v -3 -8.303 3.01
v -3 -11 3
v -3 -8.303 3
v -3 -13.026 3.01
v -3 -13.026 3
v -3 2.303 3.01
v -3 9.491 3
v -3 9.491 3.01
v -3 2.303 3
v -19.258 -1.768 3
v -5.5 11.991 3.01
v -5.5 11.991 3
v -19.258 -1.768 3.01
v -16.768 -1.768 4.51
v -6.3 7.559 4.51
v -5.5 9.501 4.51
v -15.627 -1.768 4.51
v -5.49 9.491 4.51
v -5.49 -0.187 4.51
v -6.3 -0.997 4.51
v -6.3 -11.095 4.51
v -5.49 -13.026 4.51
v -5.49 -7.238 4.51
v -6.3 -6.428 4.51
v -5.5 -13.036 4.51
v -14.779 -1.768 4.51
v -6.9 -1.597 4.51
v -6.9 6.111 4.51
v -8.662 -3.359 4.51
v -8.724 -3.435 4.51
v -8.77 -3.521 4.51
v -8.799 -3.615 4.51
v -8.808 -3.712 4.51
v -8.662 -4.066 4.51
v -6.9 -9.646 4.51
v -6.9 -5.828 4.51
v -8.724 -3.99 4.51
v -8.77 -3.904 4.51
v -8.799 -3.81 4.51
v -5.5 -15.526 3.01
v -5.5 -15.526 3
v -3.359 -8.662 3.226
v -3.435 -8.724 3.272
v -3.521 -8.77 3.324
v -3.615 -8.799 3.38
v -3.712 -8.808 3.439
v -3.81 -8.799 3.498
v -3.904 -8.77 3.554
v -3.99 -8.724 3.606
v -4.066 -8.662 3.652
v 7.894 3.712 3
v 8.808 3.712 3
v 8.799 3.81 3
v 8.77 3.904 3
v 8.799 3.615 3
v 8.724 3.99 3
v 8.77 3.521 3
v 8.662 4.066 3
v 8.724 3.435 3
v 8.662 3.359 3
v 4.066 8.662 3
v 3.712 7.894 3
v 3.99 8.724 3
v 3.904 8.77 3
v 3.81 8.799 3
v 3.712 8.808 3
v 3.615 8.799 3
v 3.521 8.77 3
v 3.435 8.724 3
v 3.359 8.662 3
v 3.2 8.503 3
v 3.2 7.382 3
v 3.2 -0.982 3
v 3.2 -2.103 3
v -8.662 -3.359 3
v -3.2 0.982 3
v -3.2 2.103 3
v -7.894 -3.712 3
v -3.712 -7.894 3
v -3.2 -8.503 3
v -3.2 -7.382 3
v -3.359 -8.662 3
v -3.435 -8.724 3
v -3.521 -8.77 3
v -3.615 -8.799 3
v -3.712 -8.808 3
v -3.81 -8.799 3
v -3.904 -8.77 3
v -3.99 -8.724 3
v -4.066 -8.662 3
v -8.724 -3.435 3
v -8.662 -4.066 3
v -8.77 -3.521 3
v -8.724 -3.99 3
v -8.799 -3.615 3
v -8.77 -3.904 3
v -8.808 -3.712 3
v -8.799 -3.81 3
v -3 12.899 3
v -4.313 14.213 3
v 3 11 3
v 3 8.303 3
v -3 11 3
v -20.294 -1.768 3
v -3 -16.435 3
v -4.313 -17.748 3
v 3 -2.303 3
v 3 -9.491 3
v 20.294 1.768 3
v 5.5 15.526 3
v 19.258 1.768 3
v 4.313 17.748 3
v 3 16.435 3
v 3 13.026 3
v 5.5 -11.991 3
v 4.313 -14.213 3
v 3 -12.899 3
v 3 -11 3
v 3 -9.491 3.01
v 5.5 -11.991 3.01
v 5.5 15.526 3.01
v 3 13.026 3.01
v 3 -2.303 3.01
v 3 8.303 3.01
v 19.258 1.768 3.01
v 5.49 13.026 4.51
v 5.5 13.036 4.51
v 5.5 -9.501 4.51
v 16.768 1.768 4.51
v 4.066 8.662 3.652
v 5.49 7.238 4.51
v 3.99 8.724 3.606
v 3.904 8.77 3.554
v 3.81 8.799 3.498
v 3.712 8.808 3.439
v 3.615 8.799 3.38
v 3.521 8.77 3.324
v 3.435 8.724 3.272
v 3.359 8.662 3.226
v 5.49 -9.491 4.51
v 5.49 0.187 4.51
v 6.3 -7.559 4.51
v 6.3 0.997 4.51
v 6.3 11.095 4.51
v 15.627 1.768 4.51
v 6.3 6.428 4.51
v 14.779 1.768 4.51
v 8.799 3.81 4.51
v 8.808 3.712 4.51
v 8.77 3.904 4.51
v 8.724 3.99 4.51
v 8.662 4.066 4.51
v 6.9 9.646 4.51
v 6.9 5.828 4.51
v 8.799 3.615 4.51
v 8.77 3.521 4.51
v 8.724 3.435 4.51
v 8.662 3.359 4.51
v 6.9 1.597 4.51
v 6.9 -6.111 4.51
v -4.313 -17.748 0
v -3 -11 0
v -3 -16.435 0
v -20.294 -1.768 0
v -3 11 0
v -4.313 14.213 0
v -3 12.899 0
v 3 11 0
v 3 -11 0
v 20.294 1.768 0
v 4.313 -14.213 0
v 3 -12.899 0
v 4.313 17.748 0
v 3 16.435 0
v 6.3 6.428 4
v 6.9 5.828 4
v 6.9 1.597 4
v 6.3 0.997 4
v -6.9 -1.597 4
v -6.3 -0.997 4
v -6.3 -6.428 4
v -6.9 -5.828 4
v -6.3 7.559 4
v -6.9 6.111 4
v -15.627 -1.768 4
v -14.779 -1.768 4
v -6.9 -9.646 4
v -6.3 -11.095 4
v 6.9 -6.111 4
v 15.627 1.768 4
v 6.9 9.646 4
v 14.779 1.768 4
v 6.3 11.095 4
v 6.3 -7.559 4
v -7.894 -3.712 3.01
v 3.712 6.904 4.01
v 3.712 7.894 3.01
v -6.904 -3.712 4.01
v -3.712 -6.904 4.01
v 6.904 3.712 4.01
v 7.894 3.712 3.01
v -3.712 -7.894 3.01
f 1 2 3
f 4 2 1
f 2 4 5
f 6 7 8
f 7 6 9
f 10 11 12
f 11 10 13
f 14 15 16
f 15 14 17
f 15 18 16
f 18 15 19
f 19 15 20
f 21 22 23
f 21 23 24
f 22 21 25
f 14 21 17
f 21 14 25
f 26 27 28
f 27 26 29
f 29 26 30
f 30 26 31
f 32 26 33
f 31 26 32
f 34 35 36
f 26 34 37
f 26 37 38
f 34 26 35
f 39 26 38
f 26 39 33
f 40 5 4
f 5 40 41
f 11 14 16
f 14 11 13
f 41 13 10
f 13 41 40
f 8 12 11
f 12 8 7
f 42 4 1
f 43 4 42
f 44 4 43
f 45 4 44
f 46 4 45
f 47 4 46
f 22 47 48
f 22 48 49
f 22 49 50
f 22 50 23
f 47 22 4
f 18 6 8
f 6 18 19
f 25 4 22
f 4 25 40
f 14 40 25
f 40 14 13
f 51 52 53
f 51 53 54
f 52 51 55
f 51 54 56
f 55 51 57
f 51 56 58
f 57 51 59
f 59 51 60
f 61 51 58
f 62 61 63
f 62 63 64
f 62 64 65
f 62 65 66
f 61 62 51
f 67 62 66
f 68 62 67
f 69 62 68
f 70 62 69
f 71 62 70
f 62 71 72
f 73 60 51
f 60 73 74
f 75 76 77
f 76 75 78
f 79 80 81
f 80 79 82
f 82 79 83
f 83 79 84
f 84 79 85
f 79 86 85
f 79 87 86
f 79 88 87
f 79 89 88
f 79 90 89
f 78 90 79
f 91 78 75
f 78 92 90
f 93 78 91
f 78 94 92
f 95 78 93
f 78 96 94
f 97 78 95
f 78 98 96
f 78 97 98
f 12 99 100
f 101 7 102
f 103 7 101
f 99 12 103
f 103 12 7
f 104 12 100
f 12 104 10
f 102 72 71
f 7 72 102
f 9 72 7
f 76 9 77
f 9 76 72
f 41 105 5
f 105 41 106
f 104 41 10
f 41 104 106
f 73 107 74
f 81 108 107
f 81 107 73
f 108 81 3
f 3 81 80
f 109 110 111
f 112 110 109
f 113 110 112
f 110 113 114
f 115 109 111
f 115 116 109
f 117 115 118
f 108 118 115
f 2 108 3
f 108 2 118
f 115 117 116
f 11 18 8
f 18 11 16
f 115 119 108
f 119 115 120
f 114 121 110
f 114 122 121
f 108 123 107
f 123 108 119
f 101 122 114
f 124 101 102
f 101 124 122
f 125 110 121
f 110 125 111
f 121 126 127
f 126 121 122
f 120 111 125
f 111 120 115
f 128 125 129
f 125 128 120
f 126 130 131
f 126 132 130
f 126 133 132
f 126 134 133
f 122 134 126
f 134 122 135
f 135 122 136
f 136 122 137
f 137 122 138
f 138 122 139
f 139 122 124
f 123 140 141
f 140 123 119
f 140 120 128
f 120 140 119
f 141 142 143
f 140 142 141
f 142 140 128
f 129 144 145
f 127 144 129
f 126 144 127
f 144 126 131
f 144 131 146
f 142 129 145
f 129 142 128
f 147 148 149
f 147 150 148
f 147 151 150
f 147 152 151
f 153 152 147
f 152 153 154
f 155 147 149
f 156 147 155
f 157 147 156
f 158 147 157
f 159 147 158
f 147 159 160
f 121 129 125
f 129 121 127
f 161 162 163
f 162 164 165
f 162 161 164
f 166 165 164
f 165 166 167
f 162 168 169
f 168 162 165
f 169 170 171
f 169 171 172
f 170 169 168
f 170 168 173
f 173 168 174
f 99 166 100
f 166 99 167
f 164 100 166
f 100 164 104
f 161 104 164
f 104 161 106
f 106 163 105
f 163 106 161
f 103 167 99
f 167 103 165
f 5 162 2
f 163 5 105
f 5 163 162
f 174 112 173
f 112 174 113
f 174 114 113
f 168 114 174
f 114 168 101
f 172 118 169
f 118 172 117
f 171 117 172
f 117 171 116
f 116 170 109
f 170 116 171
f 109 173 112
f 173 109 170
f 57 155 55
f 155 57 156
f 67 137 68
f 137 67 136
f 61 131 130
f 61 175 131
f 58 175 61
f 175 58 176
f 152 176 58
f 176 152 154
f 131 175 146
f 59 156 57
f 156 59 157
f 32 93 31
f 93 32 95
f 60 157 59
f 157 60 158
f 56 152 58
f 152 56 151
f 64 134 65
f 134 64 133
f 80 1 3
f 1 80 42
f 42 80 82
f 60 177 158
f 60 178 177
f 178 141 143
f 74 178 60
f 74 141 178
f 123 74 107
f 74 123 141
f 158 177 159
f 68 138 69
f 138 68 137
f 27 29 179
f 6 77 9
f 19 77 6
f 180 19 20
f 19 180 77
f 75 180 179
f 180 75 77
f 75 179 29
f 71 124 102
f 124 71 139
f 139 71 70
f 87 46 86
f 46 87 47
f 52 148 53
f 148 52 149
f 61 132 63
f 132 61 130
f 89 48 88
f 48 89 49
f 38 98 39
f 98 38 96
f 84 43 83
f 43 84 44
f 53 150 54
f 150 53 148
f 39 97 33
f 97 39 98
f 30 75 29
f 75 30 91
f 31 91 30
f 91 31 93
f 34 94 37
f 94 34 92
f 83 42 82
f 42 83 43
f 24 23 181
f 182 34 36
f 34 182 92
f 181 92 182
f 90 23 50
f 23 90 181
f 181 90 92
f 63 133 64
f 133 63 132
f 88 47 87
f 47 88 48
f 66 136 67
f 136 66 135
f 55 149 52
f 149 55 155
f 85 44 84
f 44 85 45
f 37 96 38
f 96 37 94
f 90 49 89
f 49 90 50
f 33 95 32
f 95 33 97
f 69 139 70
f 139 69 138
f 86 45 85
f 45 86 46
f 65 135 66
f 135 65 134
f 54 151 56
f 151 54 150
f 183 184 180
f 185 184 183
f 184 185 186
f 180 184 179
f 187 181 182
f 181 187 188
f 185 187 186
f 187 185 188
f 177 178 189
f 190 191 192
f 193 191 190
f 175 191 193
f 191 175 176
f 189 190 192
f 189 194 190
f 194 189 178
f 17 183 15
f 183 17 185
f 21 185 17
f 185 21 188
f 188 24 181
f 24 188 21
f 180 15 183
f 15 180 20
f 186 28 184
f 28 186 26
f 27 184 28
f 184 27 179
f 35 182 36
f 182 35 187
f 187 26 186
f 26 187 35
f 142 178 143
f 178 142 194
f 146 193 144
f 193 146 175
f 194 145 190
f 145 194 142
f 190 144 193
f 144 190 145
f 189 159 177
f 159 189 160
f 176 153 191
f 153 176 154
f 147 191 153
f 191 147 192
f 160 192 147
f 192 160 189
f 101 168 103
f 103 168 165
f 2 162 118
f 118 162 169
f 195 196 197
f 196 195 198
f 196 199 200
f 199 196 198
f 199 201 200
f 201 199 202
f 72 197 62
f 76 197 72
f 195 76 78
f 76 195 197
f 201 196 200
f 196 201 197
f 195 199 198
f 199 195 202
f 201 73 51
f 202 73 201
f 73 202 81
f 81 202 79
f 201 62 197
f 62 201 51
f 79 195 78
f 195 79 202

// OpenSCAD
// Stone Badge (Hoenn / Emerald)
// Built axis-aligned: two overlapping squares with a diagonal strip cut
// between them (leaving a bridge in the middle), then rotated 45 for
// display. Measured from the sprite.
// Units: mm. Badge lies flat in XY, front face up. ~40mm wide, 37.5mm tall.

$fn = 32;

sq        = 22.6;         // square side (= diamond half-diagonal 16 * sqrt2)
sq_c      = [4.3, -1.8];  // square center offset (mirrored for the other)
gap_w     = 6;            // width of the diagonal cut strip
bridge_l  = 22;           // length of the center bridge left in the cut
bridge_w  = 6.4;          // slightly wider than gap to fuse cleanly
base_t    = 3;            // main slab thickness
facet_t   = 1.5;          // bevel rise height
facet_in  = 2.5;          // bevel inset from edge (slope = facet_t/facet_in)
bar_l     = 17;           // dark bar on top, runs along the cut diagonal
bar_w     = 6.5;
bar_t     = 1.0;          // bar rise above slab (kept below the facets)
bar_in    = 1.0;          // bar bevel inset
bar_gap   = 0.5;          // reveal gap around the bar in its channel
groove_in = 0.8;          // facet outline groove: inset from plateau edge
groove_w  = 0.6;
groove_d  = 0.5;

C_GOLD = [0.85, 0.72, 0.35];
C_PINK = [0.80, 0.45, 0.50];
C_BAR  = [0.45, 0.38, 0.15];

// square pyramid, base faces parallel to the XY axes (for mitred bevels)
module pyramid(r, h) rotate(45) cylinder(r1 = r, r2 = 0.01, h = h, $fn = 4);

// the diagonal cut, minus the middle where the bridge bridges it
module notches2d() rotate(45) {
    translate([bridge_l / 2, -gap_w / 2]) square([50, gap_w]);
    translate([-bridge_l / 2 - 50, -gap_w / 2]) square([50, gap_w]);
}

module arrows2d() difference() {
    for (m = [0, 1]) mirror([m, 0]) mirror([0, m])
        translate(sq_c) square(sq, center = true);
    rotate(45) square([200, gap_w], center = true);  // full diagonal cut
}

module bridge2d() rotate(45) square([bridge_l, bridge_w], center = true);

module silhouette2d() { arrows2d(); bridge2d(); }

module bar2d() square([bar_l, bar_w], center = true);

module stone_badge() {
    color(C_GOLD) difference() {
        union() {
            linear_extrude(base_t) arrows2d();
            // beveled edges rising to a flat inner facet: minkowski of the
            // inset face with a 4-sided pyramid whose faces are parallel to
            // the square edges -> flat slopes, sharp mitred corners
            translate([0, 0, base_t]) minkowski() {
                linear_extrude(0.01) offset(-facet_in) arrows2d();
                pyramid(facet_in, facet_t);
            }
        }
        // recessed channel where the bar crosses the arrows
        translate([0, 0, base_t]) linear_extrude(10) offset(bar_gap) bar2d();
        // engraved inner outline on the facet plateaus
        translate([0, 0, base_t + facet_t - groove_d]) linear_extrude(10)
            difference() {
                offset(-facet_in - groove_in) arrows2d();
                offset(-facet_in - groove_in - groove_w) arrows2d();
            }
    }

    color(C_PINK) linear_extrude(base_t) bridge2d();

    // dark bar along the cut diagonal: lower than the facets, beveled too
    color(C_BAR) translate([0, 0, base_t])
        minkowski() {
            linear_extrude(0.01) offset(-bar_in) bar2d();
            pyramid(bar_in, bar_t);
        }
}

// display orientation: squares become the diamonds of the sprite
module stone_badge_display() rotate(45) stone_badge();

stone_badge_display();
